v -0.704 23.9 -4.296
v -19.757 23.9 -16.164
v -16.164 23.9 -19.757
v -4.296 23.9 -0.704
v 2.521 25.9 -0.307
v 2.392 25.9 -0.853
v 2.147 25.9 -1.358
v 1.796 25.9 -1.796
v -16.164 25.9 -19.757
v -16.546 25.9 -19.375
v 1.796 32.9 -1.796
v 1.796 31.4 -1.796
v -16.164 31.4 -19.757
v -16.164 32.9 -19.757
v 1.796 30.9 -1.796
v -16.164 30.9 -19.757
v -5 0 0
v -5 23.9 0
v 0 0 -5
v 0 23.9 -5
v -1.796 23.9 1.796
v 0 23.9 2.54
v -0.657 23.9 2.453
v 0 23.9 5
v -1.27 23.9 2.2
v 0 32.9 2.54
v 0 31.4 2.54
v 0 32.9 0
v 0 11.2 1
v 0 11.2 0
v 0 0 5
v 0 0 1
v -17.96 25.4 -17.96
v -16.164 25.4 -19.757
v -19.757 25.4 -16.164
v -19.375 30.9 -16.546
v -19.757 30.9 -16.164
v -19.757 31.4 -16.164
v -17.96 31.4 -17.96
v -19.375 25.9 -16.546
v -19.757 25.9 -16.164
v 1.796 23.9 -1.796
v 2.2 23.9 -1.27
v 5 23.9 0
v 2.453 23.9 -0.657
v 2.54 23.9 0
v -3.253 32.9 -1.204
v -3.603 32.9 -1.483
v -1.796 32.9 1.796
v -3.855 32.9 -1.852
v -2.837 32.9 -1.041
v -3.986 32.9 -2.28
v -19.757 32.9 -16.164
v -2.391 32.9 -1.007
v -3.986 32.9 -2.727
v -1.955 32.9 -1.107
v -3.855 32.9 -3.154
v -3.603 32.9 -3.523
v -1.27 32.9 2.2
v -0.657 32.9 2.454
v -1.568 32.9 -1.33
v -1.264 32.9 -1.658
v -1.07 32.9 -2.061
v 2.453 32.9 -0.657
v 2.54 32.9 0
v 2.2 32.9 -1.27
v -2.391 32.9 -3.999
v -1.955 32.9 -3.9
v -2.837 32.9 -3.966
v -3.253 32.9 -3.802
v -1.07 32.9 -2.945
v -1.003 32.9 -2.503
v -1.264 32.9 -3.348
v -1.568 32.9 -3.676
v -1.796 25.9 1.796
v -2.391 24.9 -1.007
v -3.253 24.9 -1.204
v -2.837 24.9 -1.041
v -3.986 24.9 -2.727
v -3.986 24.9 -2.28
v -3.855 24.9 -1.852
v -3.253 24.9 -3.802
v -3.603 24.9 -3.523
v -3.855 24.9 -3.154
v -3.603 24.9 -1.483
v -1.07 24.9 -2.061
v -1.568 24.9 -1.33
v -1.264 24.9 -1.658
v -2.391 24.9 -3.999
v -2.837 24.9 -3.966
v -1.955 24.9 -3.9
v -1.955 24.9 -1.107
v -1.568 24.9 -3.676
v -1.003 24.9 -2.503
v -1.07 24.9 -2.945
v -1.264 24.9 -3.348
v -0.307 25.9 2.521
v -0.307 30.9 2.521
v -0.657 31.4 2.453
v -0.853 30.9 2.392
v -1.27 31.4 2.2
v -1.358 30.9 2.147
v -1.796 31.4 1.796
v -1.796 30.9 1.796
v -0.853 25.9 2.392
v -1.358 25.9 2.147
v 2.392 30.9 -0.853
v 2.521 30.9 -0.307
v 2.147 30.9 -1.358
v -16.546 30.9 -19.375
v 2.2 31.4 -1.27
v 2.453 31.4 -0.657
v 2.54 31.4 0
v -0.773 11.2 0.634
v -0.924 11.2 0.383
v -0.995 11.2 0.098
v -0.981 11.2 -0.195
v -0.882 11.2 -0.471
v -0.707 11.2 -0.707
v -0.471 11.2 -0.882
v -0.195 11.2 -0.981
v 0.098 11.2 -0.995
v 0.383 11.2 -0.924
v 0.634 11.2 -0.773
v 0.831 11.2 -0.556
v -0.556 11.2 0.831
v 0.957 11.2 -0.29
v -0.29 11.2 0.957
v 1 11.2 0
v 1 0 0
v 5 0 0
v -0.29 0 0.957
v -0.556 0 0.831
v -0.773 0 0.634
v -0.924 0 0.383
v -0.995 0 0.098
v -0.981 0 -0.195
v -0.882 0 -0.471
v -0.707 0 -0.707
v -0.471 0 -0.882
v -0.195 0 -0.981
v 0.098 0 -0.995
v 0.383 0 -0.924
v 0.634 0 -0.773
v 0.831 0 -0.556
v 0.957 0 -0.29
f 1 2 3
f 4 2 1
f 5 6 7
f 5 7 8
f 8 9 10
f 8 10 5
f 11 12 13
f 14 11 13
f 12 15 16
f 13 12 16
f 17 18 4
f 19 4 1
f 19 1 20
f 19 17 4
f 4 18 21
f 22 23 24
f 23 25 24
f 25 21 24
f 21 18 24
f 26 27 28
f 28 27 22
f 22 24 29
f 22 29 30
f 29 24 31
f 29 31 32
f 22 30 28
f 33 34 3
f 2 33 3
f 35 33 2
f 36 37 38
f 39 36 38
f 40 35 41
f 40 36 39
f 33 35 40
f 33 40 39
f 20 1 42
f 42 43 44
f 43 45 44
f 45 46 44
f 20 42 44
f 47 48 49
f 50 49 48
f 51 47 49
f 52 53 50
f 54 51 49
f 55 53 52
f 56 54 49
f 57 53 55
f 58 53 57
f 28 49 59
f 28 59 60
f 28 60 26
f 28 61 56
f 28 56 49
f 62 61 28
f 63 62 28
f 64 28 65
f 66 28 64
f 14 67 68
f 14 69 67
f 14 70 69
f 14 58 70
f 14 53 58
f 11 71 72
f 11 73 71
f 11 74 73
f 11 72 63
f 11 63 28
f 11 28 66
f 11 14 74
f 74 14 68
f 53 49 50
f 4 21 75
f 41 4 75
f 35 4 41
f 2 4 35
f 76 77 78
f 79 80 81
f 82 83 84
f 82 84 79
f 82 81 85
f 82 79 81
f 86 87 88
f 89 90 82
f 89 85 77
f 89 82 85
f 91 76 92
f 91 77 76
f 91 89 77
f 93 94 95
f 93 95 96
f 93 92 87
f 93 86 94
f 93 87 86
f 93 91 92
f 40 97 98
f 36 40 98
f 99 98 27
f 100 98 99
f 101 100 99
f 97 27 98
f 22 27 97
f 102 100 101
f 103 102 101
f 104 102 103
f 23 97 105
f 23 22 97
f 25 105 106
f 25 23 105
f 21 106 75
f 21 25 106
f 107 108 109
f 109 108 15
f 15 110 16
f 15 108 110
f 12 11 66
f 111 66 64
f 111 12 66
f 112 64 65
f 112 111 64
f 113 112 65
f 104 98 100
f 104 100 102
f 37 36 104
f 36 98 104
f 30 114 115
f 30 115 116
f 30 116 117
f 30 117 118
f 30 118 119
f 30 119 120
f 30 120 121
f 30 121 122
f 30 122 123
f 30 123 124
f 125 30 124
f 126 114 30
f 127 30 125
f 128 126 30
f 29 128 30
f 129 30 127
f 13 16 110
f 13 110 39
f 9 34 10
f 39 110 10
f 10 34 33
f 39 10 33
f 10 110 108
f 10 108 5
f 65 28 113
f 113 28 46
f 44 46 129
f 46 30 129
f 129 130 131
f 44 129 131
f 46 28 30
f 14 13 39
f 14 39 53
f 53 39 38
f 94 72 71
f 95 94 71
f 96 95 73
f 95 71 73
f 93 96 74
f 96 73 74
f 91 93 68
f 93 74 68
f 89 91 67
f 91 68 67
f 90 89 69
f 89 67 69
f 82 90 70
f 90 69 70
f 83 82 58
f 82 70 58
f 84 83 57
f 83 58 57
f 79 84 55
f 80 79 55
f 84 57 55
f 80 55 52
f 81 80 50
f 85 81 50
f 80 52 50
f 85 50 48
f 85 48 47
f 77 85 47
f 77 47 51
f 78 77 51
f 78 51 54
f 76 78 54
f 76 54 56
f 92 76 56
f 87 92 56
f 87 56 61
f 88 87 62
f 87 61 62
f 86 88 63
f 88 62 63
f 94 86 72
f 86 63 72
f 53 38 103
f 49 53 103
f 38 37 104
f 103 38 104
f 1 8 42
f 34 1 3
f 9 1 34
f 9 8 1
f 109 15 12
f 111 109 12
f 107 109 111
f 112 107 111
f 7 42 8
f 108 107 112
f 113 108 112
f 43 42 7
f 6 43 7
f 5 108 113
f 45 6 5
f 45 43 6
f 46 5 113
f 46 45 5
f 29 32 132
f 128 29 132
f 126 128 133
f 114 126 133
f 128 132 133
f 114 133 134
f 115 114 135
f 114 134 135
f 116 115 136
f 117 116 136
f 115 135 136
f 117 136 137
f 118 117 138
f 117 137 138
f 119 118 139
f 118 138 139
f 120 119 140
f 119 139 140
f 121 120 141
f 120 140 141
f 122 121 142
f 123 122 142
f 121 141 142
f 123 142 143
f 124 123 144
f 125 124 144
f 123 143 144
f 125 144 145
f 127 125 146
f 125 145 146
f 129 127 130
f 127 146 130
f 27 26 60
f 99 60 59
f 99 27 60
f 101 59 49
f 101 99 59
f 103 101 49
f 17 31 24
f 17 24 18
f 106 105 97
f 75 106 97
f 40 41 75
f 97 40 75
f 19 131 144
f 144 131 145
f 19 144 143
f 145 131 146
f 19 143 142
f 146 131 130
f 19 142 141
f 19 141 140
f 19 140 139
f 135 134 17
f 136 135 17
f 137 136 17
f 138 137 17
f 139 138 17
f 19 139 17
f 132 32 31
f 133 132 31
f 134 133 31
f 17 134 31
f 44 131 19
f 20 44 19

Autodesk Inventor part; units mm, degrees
ref_plane "YZ Plane" through (0, 0, 0) normal (1, 0, 0) x (0, 1, 0)
ref_plane "XZ Plane" through (0, 0, 0) normal (0, 1, 0) x (-1, 0, 0)
ref_plane "XY Plane" through (0, 0, 0) normal (0, 0, 1) x (1, 0, 0)
sketch "Sketch1" plane through (0, 0, 0) normal (0, 1, 0) x (-1, 0, 0)
  arc A0 (-2.54, 0) -> (0, 2.54) centre (0, 0) ccw
  line L0 (0, 2.54) -> (0, 0)
  line L1 (0, 0) -> (-2.54, 0)
  dimension "d0" = 5.08
extrude "Extrusion1" add sketch "Sketch1" along normal blind 25.4
sketch "Sketch2" plane through (0, 25.4, 0) normal (0, 1, 0) x (1, 0, 0)
  line L0 (0, -2.54) -> (0, 0) projected
  line L1 (0, 0) -> (-17.9605, 17.9605)
  line L2 (0, 0) -> (25.4, 0) construction
  line L3 (0, 0) -> (-1.7961, -1.7961)
  arc A0 (2.54, 0) -> (0, -2.54) centre (0, 0) ccw projected
  line L4 (0, 0) -> (1.7961, 1.7961)
  line L5 (-1.7961, -1.7961) -> (-19.7566, 16.1645)
  line L6 (-19.7566, 16.1645) -> (-17.9605, 17.9605)
  line L7 (-16.1645, 19.7566) -> (1.7961, 1.7961)
  line L8 (-16.1645, 19.7566) -> (-17.9605, 17.9605)
  line L9 (0, 0) -> (2.54, 0)
  dimension "d3" = 25.4
  dimension "d4" = 135
extrude "Extrusion2" add sketch "Sketch2" along normal blind 6
sketch "Sketch3" plane through (-19.7566, 25.4, -16.1645) normal (-0.7071068, 0, -0.7071068) x (-0.7071068, 0, 0.7071068)
  line L0 (-5.08, 0) -> (-5.08, 6) projected
  line L1 (0, 6) -> (-5.08, 6)
  line L2 (-5.08, 6) -> (-5.08, 0)
  line L3 (-5.08, 0) -> (0, 0)
  line L4 (0, 0.5) -> (0, 5.5)
  line L5 (-2.54, 6) -> (-4.3361, 6) projected
  line L6 (-2.54, 6) -> (-2.54, 0)
  line L7 (-4.54, 0) -> (-0.54, 0)
  line L8 (-0.54, 0.5) -> (-0.54, 5.5)
  line L9 (-0.54, 6) -> (-4.54, 6)
  line L10 (-4.54, 6) -> (-4.54, 0)
  line L11 (-4.54, 0) -> (-0.54, 6) construction
  line L12 (-0.54, 0) -> (-4.54, 6) construction
  line L13 (0, 0.5) -> (-5.08, 0.5)
  line L14 (-5.08, 0.5) -> (-5.08, 5.5)
  line L15 (-5.08, 5.5) -> (0, 5.5)
  line L16 (0, 0.5) -> (-5.08, 5.5) construction
  line L17 (-5.08, 0.5) -> (0, 5.5) construction
  line L18 (-5.08, 0) -> (0, 0)
  line L19 (0, 0) -> (0, 6)
  line L20 (0, 6) -> (-5.08, 6)
  line L21 (-5.08, 6) -> (-5.08, 0)
  line L22 (-5.08, 0) -> (0, 6) construction
  line L23 (0, 0) -> (-5.08, 6) construction
  line L24 (-0.7439, 6) -> (0, 6)
  line L25 (-5.08, 0) -> (0, 0)
  line L26 (0, 0) -> (0, 6)
  line L27 (0, 6) -> (-5.08, 6)
  line L28 (-5.08, 6) -> (-5.08, 0)
  line L29 (-5.08, 0) -> (0, 6) construction
  line L30 (0, 0) -> (-5.08, 6) construction
  line L31 (0, 6) -> (0, 0)
  line L32 (-4.54, 5.5) -> (-9.54, 5.5)
  line L33 (-9.54, 5.5) -> (-9.54, 0.5)
  line L34 (-9.54, 0.5) -> (-4.54, 0.5)
  line L35 (-4.54, 0.5) -> (-4.54, 5.5)
  line L36 (-0.54, 5.5) -> (4.46, 5.5)
  line L37 (4.46, 5.5) -> (4.46, 0.5)
  line L38 (4.46, 0.5) -> (-0.54, 0.5)
  line L39 (-0.54, 0.5) -> (-0.54, 5.5)
  point P0 (-2.54, -25.4)
  point P1 (-2.54, 3)
  point P2 (-4.54, 5.5)
  point P3 (-5.08, 5.5)
  point P4 (-5.08, 0.5)
  point P5 (-4.54, 0.5)
  point P6 (0, 5.5)
  point P7 (0, 0.5)
  point P8 (-5.08, 0.5)
  point P9 (-5.08, 5.5)
  dimension "d7" = 4
  dimension "d8" = 5
  dimension "d11" = 6
  dimension "d40" = 5
  dimension "d41" = 5
extrude "Extrusion5" cut sketch "Sketch3" against normal blind 33.8125 contours L34 L33 L32 L0 | L0 L15 L10 L13 | L8 L15 L4 L13 | L4 L36 L37 L38
sketch "Sketch6" plane through (0, 31.4, 0) normal (0, 1, 0) x (1, 0, 0)
  arc A0 (1.7961, 1.7961) -> (-1.7961, -1.7961) centre (0, 0) ccw projected
  circle A1 centre (0, 0) radius 2.54
  line L0 (1.7961, 1.7961) -> (-16.1645, 19.7566) projected
  line L1 (0, 3.5921) -> (-3.5921, 0)
  line L2 (-19.7566, 16.1645) -> (-1.7961, -1.7961) projected
  line L3 (-1.7961, 1.7961) -> (-2.5032, 2.5032)
  circle A2 centre (-2.5032, 2.5032) radius 2.54
  dimension "d16" = 1
ref_plane "Work Plane3" through (-2.5032, 37.9, -2.5032) normal (0, 1, 0) x (1, 0, 0)
sketch "Sketch7" plane through (-2.5032, 37.9, -2.5032) normal (0, 1, 0) x (1, 0, 0)
  circle A0 centre (0, 0) radius 1.5
  point P0 (2.5032, -2.5032)
  dimension "d19" = 3
extrude "Extrusion7" cut sketch "Sketch7" against normal blind 6
sketch "Sketch10" plane through (0, 31.4, 0) normal (0, 1, 0) x (1, 0, 0)
  arc A0 (-1.7961, -1.7961) -> (0, -2.54) centre (0, 0) ccw projected
  line L0 (0, -2.54) -> (0, 0) projected
  line L1 (0, 0) -> (2.54, 0) projected
  line L2 (1.7961, 1.7961) -> (-16.1645, 19.7566) projected
  line L3 (-19.7566, 16.1645) -> (-1.7961, -1.7961) projected
  line L4 (-19.7566, 16.1645) -> (-1.7961, -1.7961) projected
  line L5 (-16.1645, 19.7566) -> (-19.7566, 16.1645) projected
  line L6 (1.7961, 1.7961) -> (-16.1645, 19.7566) projected
  arc A1 (2.54, 0) -> (1.7961, 1.7961) centre (0, 0) ccw projected
  point P0 (-0.7071, 4.2992)
  point P1 (2.5214, 0.3071)
  point P2 (-4.2992, 0.7071)
extrude "Extrusion9" add sketch "Sketch10" along normal blind 1.5
sketch "Sketch11" plane through (0, 25.4, 0) normal (0, -1, 0) x (1, 0, 0)
  arc A0 (-1.7961, 1.7961) -> (1.7961, -1.7961) centre (0, 0) ccw projected
  line L0 (-19.7566, -16.1645) -> (-1.7961, 1.7961) projected
  line L1 (-16.1645, -19.7566) -> (-19.7566, -16.1645) projected
  line L2 (1.7961, -1.7961) -> (-16.1645, -19.7566) projected
extrude "Extrusion10" add sketch "Sketch11" along normal blind 1.5
sketch "Sketch13" plane through (0, 0, 0) normal (0, -1, 0) x (1, 0, 0)
  line L0 (0, 0) -> (2.54, 0) projected
  arc A0 (0, 5) -> (5, 0) centre (0, 0) ccw
  line L1 (0, 0) -> (0, 5)
  line L2 (0, 0) -> (5, 0)
  dimension "d37" = 10
extrude "Extrusion12" add sketch "Sketch13" against normal up to surface (23.9 mm away)
sketch "Sketch14" plane through (0, 0, 0) normal (0, -1, 0) x (1, 0, 0)
  circle A0 centre (0, 0) radius 1
  dimension "d42" = 2
extrude "Extrusion13" cut sketch "Sketch14" against normal blind 11.2
sketch "Sketch15" plane through (0, 32.9, 0) normal (0, 1, 0) x (1, 0, 0)
  circle A0 centre (-2.5032, 2.5032) radius 1.5 projected
  circle A1 centre (-2.5032, 2.5032) radius 1.5
  point P0 (0, 0)
extrude "Extrusion14" cut sketch "Sketch15" against normal blind 8
thread "Thread2" size "M3x0.5" class "6H" standard "ANSI Metric M Profile" full length
sketch "Sketch16" plane through (0, 0, 0) normal (0, -1, 0) x (1, 0, 0)
  arc A0 (0, 5) -> (5, 0) centre (0, 0) ccw projected
  line L0 (0, 0) -> (3.981, 3.981)
  line L1 (0, 0) -> (5.63, 0) construction
  line L2 (0, 5) -> (-5, 0)
  line L3 (5, 0) -> (0, -5)
  line L4 (-5, 0) -> (0, -5)
  circle A1 centre (0, 0) radius 5
  dimension "d52" = 45
extrude "Extrusion15" cut sketch "Sketch16" against normal up to surface (23.9 mm away) contours L2 A0 | L4 A0 | L3 A0
sketch "Sketch17" plane through (-19.3747, 25.9, -16.5463) normal (-0.7071068, 0, -0.7071068) x (-0.7071068, 0, 0.7071068)
  line L0 (0, 0) -> (0.54, 0) projected
  line L1 (0.54, 5) -> (0, 5) projected
  line L2 (-4, 0) -> (-4, 5) projected
  line L3 (-4.54, 0) -> (-4, 0) projected
  line L4 (-4, 5) -> (-4.54, 5) projected
  line L5 (0.54, -2) -> (0.54, 0) projected
  line L6 (0.54, -2) -> (-0.2039, -2) projected
  line L7 (-2, 7) -> (-3.7961, 7) projected
  line L8 (-4.54, 5) -> (-4.54, 7) projected
  line L9 (-3.7961, 7) -> (-4.54, 7) projected
  line L10 (0.54, -2) -> (-0.2039, -2) projected
  line L11 (-0.2039, -2) -> (-0.2039, 7) projected
  line L12 (0.54, 7) -> (-0.2039, 7) projected
  line L13 (0.54, 5) -> (0.54, 7) projected
  line L14 (0.54, 5) -> (0, 5) projected
  line L15 (0, 5) -> (0, 0) projected
  line L16 (0, 0) -> (0.54, 0) projected
  line L17 (0.54, -2) -> (0.54, 0) projected
  line L18 (-3.7961, -2) -> (-3.7961, 7) projected
  line L19 (-3.7961, -2) -> (-4.54, -2) projected
  line L20 (-4.54, -2) -> (-4.54, 0) projected
  line L21 (-4.54, 0) -> (-4, 0) projected
  line L22 (-4, 0) -> (-4, 5) projected
  line L23 (-4, 5) -> (-4.54, 5) projected
  line L24 (-4.54, 5) -> (-4.54, 7) projected
  line L25 (-3.7961, 7) -> (-4.54, 7) projected
  line L26 (-3.7961, -2) -> (-3.7961, 7) projected
  line L27 (0.54, -2) -> (-4.54, -2) projected
  line L28 (0, 5) -> (0, 0) projected
  line L29 (-3.7961, -2) -> (-4.54, -2) projected
  line L30 (0.54, -2) -> (-4.54, -2) projected
  line L31 (0.54, 0) -> (0, 0) projected
  line L32 (0, 0) -> (0, 5) projected
  line L33 (0, 5) -> (0.54, 5) projected
  line L34 (0.54, 5) -> (0.54, 7) projected
  line L35 (-4.54, 7) -> (0.54, 7) projected
  line L36 (-4.54, 5) -> (-4.54, 7) projected
  line L37 (-4.54, 5) -> (-4, 5) projected
  line L38 (-4, 5) -> (-4, 0) projected
  line L39 (-4, 0) -> (-4.54, 0) projected
  line L40 (-4.54, -2) -> (-4.54, 0) projected
  line L41 (0.54, -2) -> (-4.54, -2) projected
  line L42 (0.54, 0) -> (0.54, -2) projected
  line L43 (-3.5, 7) -> (-0.5, 7) projected
  line L44 (-0.2039, 7) -> (-2, 7) projected
  line L45 (-2, 7) -> (-3.7961, 7) projected
  line L46 (-3.7961, 7) -> (-4.54, 7) projected
  line L47 (-4.54, 7) -> (0.54, 7) projected
  line L48 (0.54, 7) -> (-0.2039, 7) projected
  line L49 (0.54, -2) -> (-4.54, -2) projected
  line L50 (0.54, -2) -> (-4.54, -2) projected
  line L51 (0.54, 5) -> (0.54, 7) projected
  line L52 (0, 5) -> (0.54, 5) projected
  line L53 (0.54, 5) -> (0.54, 7) projected
  line L54 (0.54, 0) -> (0, 0) projected
  line L55 (0.54, 5) -> (0.54, 7) projected
  line L56 (0.54, 5) -> (0.54, 7) projected
  line L57 (0.54, 0) -> (0.54, -2) projected
  line L58 (0.54, -2) -> (0.54, 0) projected
  line L59 (0.54, 5) -> (0, 5) projected
  line L60 (0, 5) -> (0.54, 5) projected
  line L61 (0, 0) -> (0.54, 0) projected
  line L62 (0.54, 0) -> (0, 0) projected
  line L63 (0, 5) -> (0, 0) projected
  line L64 (0, 0) -> (0, 5) projected
  line L65 (-4.54, -2) -> (-4.54, 0) projected
  line L66 (0.54, 7) -> (-0.2039, 7) projected
  line L67 (-4.54, 5) -> (-4.54, 7) projected
  line L68 (-4.54, -2) -> (-4.54, 0) projected
  line L69 (-4, 0) -> (-4.54, 0) projected
  line L70 (-4.54, 5) -> (-4, 5) projected
  line L71 (-4, 0) -> (-4, 5) projected
  line L72 (-4, 5) -> (-4, 0) projected
  line L73 (-4, 0) -> (-4.54, 0) projected
  line L74 (-4.54, 0) -> (-4, 0) projected
  line L75 (-4, 5) -> (-4.54, 5) projected
  line L76 (-4.54, 5) -> (-4, 5) projected
  line L77 (-4.54, -2) -> (-4.54, 0) projected
  line L78 (-4.54, -2) -> (-4.54, 0) projected
  line L79 (-4.54, 5) -> (-4.54, 7) projected
  line L80 (-4.54, 5) -> (-4.54, 7) projected
  line L81 (-4.54, 7) -> (0.54, 7) projected
  line L82 (-4, 5) -> (-4, 0) projected
  line L83 (0.54, 0) -> (0.54, -2) projected
  line L84 (-0.2039, -2) -> (-0.2039, 7) projected
  line L85 (-3.5, -1) -> (-0.5, -1) projected
  line L86 (-3.5, -1) -> (-0.5, -1) projected
  line L87 (-3.5, 7) -> (-0.5, 7) projected
  line L88 (-3.5, -1) -> (-0.5, -1) projected
  line L89 (-3.5, 7) -> (-0.5, 7) projected
  line L90 (0, 0) -> (0, 5) projected
  line L91 (-0.2039, 7) -> (-2, 7) projected
  line L92 (0.54, 5.5) -> (-4.54, 5.5) projected
  line L93 (0.54, 5.5) -> (-4.54, 5.5) projected
  line L94 (-4.54, 5.5) -> (0.54, 5.5) projected
  line L95 (0.54, 5.5) -> (-4.54, 5.5) projected
  point P0 (-2, -25.9)
  point P1 (-2, 5.5)
  point P2 (-2, 5.5)
  point P3 (-2, 5.5)
  point P4 (-4.54, 5.5)
  point P5 (0.54, 5.5)
  point P6 (0.54, 5.5)
  point P7 (-2, 5.5)
  point P8 (-2, 5.5)
  point P9 (-2, 5.5)
  point P10 (-2, 5.5)
sketch "Sketch18" plane through (0, 32.9, 0) normal (0, 1, 0) x (1, 0, 0)
  point P0 (0, 0)
sketch "Sketch19" plane through (0, 0, 0) normal (0, -1, 0) x (1, 0, 0)
  arc A0 (-0.3071, 2.5214) -> (-1.7961, 1.7961) centre (0, 0) ccw projected
  arc A1 (-0.3071, 2.5214) -> (-1.7961, 1.7961) centre (0, 0) ccw projected
  arc A2 (1.7961, -1.7961) -> (2.5214, -0.3071) centre (0, 0) ccw projected
  arc A3 (1.7961, -1.7961) -> (2.5214, -0.3071) centre (0, 0) ccw projected
  arc A4 (0, 2.54) -> (-1.7961, 1.7961) centre (0, 0) ccw projected
  line L0 (0, 5) -> (0, 2.54) projected
  line L1 (0, 0) -> (2.54, 0) projected
  line L2 (-1.7961, 1.7961) -> (-4.2961, -0.7039) projected
  arc A5 (1.7961, -1.7961) -> (2.54, 0) centre (0, 0) ccw projected
  line L3 (-4.2961, -0.7039) -> (-5, 0) projected
  arc A6 (0, 2.54) -> (-1.7961, 1.7961) centre (0, 0) ccw projected
  arc A7 (0, 2.54) -> (-1.7961, 1.7961) centre (0, 0) ccw projected
  arc A8 (-0.3071, 2.5214) -> (-1.7961, 1.7961) centre (0, 0) ccw projected
  arc A9 (-0.3071, 2.5214) -> (-1.7961, 1.7961) centre (0, 0) ccw projected
  line L4 (-5, 0) -> (0, 5) projected
  line L5 (-5, 0) -> (0, 5) projected
  line L6 (0, 5) -> (0, 2.54) projected
  arc A10 (0, 2.54) -> (-1.7961, 1.7961) centre (0, 0) ccw projected
  line L7 (-1.7961, 1.7961) -> (-4.2961, -0.7039) projected
  line L8 (-4.2961, -0.7039) -> (-5, 0) projected
  arc A11 (1.7961, -1.7961) -> (2.54, 0) centre (0, 0) ccw projected
  arc A12 (1.7961, -1.7961) -> (2.5214, -0.3071) centre (0, 0) ccw projected
  arc A13 (1.7961, -1.7961) -> (2.5214, -0.3071) centre (0, 0) ccw projected
  arc A14 (1.7961, -1.7961) -> (2.54, 0) centre (0, 0) ccw projected
  line L9 (-4.2961, -0.7039) -> (-0.7039, -4.2961) projected
  line L10 (0, 1) -> (0, 0) projected
  line L11 (0, 1) -> (0, 0) projected
  line L12 (0, 2.54) -> (0, 0) projected
  line L13 (0, 5) -> (0, 2.54) projected
  line L14 (0, 5) -> (0, 1) projected
  line L15 (0, 0) -> (1, 0) projected
  line L16 (1, 0) -> (5, 0) projected
  line L17 (2.54, 0) -> (5, 0) projected
  line L18 (0, 0) -> (2.54, 0) projected
  line L19 (5, 0) -> (0, -5) projected
  line L20 (0, -5) -> (5, 0) projected
  line L21 (-4.2961, -0.7039) -> (-5, 0) projected
  line L22 (-4.2961, -0.7039) -> (-0.7039, -4.2961) projected
  line L23 (0, -5) -> (-0.7039, -4.2961) projected
  line L24 (-5, 0) -> (0, -5) projected
  line L25 (-5, 0) -> (0, -5) projected
  line L26 (0, 5) -> (-5, 0) projected
  line L27 (-5, 0) -> (0, 5) projected
  line L28 (0, 5) -> (-5, 0) projected
  line L29 (0, -5) -> (-0.7039, -4.2961) projected
  arc A15 (1.7961, -1.7961) -> (2.54, 0) centre (0, 0) ccw projected
  line L30 (-0.7039, -4.2961) -> (1.7961, -1.7961) projected
  line L31 (2.54, 0) -> (5, 0) projected
  line L32 (5, 0) -> (0, -5) projected
  line L33 (0, -5) -> (-0.7039, -4.2961) projected
  line L34 (-0.7039, -4.2961) -> (1.7961, -1.7961) projected
  arc A16 (1.7961, -1.7961) -> (2.54, 0) centre (0, 0) ccw projected
  line L35 (2.54, 0) -> (5, 0) projected
  line L36 (5, 0) -> (0, -5) projected
  arc A17 (0, 2.54) -> (-1.7961, 1.7961) centre (0, 0) ccw projected
  circle A18 centre (-2.5032, -2.5032) radius 1.5 projected
  circle A19 centre (-2.5032, -2.5032) radius 1.5 projected
  circle A20 centre (-2.5032, -2.5032) radius 1.5 projected
  circle A21 centre (-2.5032, -2.5032) radius 1.5 projected
  circle A22 centre (-2.5032, -2.5032) radius 1.5 projected
  line L37 (0, 5) -> (0, 1) projected
  arc A23 (0, 1) -> (1, 0) centre (0, 0) ccw projected
  line L38 (0, -5) -> (5, 0) projected
  line L39 (1, 0) -> (5, 0) projected
  line L40 (0, 0) -> (1, 0) projected
  arc A24 (0, 1) -> (1, 0) centre (0, 0) ccw projected
  line L41 (0, 0) -> (1, 0) projected
  line L42 (0, 1) -> (0, 0) projected
  arc A25 (0, 1) -> (1, 0) centre (0, 0) ccw projected
  arc A26 (0, 1) -> (1, 0) centre (0, 0) ccw projected
  arc A27 (0, 1) -> (1, 0) centre (0, 0) ccw projected
  line L43 (0, 5) -> (-5, 0) projected
  line L44 (-5, 0) -> (0, -5) projected
  line L45 (0, -5) -> (5, 0) projected
  line L46 (1, 0) -> (5, 0) projected
  arc A28 (0, 1) -> (1, 0) centre (0, 0) ccw projected
  line L47 (0, 5) -> (0, 1) projected
  line L48 (0, 2.54) -> (0, 0) projected
  arc A29 (-1.7961, 1.7961) -> (1.7961, -1.7961) centre (0, 0) ccw projected
  circle A30 centre (0, 0) radius 2.54 projected
  line L49 (0, -3.5921) -> (-3.5921, 0) projected
  line L50 (-1.7961, -1.7961) -> (-2.5032, -2.5032) projected
  circle A31 centre (-2.5032, -2.5032) radius 2.54 projected
  line L51 (-19.7566, -16.1645) -> (-16.1645, -19.7566) projected
  dimension "d55" = 21.8645
properties part number "Redesign_Gripper_Finger_3DPrint"
